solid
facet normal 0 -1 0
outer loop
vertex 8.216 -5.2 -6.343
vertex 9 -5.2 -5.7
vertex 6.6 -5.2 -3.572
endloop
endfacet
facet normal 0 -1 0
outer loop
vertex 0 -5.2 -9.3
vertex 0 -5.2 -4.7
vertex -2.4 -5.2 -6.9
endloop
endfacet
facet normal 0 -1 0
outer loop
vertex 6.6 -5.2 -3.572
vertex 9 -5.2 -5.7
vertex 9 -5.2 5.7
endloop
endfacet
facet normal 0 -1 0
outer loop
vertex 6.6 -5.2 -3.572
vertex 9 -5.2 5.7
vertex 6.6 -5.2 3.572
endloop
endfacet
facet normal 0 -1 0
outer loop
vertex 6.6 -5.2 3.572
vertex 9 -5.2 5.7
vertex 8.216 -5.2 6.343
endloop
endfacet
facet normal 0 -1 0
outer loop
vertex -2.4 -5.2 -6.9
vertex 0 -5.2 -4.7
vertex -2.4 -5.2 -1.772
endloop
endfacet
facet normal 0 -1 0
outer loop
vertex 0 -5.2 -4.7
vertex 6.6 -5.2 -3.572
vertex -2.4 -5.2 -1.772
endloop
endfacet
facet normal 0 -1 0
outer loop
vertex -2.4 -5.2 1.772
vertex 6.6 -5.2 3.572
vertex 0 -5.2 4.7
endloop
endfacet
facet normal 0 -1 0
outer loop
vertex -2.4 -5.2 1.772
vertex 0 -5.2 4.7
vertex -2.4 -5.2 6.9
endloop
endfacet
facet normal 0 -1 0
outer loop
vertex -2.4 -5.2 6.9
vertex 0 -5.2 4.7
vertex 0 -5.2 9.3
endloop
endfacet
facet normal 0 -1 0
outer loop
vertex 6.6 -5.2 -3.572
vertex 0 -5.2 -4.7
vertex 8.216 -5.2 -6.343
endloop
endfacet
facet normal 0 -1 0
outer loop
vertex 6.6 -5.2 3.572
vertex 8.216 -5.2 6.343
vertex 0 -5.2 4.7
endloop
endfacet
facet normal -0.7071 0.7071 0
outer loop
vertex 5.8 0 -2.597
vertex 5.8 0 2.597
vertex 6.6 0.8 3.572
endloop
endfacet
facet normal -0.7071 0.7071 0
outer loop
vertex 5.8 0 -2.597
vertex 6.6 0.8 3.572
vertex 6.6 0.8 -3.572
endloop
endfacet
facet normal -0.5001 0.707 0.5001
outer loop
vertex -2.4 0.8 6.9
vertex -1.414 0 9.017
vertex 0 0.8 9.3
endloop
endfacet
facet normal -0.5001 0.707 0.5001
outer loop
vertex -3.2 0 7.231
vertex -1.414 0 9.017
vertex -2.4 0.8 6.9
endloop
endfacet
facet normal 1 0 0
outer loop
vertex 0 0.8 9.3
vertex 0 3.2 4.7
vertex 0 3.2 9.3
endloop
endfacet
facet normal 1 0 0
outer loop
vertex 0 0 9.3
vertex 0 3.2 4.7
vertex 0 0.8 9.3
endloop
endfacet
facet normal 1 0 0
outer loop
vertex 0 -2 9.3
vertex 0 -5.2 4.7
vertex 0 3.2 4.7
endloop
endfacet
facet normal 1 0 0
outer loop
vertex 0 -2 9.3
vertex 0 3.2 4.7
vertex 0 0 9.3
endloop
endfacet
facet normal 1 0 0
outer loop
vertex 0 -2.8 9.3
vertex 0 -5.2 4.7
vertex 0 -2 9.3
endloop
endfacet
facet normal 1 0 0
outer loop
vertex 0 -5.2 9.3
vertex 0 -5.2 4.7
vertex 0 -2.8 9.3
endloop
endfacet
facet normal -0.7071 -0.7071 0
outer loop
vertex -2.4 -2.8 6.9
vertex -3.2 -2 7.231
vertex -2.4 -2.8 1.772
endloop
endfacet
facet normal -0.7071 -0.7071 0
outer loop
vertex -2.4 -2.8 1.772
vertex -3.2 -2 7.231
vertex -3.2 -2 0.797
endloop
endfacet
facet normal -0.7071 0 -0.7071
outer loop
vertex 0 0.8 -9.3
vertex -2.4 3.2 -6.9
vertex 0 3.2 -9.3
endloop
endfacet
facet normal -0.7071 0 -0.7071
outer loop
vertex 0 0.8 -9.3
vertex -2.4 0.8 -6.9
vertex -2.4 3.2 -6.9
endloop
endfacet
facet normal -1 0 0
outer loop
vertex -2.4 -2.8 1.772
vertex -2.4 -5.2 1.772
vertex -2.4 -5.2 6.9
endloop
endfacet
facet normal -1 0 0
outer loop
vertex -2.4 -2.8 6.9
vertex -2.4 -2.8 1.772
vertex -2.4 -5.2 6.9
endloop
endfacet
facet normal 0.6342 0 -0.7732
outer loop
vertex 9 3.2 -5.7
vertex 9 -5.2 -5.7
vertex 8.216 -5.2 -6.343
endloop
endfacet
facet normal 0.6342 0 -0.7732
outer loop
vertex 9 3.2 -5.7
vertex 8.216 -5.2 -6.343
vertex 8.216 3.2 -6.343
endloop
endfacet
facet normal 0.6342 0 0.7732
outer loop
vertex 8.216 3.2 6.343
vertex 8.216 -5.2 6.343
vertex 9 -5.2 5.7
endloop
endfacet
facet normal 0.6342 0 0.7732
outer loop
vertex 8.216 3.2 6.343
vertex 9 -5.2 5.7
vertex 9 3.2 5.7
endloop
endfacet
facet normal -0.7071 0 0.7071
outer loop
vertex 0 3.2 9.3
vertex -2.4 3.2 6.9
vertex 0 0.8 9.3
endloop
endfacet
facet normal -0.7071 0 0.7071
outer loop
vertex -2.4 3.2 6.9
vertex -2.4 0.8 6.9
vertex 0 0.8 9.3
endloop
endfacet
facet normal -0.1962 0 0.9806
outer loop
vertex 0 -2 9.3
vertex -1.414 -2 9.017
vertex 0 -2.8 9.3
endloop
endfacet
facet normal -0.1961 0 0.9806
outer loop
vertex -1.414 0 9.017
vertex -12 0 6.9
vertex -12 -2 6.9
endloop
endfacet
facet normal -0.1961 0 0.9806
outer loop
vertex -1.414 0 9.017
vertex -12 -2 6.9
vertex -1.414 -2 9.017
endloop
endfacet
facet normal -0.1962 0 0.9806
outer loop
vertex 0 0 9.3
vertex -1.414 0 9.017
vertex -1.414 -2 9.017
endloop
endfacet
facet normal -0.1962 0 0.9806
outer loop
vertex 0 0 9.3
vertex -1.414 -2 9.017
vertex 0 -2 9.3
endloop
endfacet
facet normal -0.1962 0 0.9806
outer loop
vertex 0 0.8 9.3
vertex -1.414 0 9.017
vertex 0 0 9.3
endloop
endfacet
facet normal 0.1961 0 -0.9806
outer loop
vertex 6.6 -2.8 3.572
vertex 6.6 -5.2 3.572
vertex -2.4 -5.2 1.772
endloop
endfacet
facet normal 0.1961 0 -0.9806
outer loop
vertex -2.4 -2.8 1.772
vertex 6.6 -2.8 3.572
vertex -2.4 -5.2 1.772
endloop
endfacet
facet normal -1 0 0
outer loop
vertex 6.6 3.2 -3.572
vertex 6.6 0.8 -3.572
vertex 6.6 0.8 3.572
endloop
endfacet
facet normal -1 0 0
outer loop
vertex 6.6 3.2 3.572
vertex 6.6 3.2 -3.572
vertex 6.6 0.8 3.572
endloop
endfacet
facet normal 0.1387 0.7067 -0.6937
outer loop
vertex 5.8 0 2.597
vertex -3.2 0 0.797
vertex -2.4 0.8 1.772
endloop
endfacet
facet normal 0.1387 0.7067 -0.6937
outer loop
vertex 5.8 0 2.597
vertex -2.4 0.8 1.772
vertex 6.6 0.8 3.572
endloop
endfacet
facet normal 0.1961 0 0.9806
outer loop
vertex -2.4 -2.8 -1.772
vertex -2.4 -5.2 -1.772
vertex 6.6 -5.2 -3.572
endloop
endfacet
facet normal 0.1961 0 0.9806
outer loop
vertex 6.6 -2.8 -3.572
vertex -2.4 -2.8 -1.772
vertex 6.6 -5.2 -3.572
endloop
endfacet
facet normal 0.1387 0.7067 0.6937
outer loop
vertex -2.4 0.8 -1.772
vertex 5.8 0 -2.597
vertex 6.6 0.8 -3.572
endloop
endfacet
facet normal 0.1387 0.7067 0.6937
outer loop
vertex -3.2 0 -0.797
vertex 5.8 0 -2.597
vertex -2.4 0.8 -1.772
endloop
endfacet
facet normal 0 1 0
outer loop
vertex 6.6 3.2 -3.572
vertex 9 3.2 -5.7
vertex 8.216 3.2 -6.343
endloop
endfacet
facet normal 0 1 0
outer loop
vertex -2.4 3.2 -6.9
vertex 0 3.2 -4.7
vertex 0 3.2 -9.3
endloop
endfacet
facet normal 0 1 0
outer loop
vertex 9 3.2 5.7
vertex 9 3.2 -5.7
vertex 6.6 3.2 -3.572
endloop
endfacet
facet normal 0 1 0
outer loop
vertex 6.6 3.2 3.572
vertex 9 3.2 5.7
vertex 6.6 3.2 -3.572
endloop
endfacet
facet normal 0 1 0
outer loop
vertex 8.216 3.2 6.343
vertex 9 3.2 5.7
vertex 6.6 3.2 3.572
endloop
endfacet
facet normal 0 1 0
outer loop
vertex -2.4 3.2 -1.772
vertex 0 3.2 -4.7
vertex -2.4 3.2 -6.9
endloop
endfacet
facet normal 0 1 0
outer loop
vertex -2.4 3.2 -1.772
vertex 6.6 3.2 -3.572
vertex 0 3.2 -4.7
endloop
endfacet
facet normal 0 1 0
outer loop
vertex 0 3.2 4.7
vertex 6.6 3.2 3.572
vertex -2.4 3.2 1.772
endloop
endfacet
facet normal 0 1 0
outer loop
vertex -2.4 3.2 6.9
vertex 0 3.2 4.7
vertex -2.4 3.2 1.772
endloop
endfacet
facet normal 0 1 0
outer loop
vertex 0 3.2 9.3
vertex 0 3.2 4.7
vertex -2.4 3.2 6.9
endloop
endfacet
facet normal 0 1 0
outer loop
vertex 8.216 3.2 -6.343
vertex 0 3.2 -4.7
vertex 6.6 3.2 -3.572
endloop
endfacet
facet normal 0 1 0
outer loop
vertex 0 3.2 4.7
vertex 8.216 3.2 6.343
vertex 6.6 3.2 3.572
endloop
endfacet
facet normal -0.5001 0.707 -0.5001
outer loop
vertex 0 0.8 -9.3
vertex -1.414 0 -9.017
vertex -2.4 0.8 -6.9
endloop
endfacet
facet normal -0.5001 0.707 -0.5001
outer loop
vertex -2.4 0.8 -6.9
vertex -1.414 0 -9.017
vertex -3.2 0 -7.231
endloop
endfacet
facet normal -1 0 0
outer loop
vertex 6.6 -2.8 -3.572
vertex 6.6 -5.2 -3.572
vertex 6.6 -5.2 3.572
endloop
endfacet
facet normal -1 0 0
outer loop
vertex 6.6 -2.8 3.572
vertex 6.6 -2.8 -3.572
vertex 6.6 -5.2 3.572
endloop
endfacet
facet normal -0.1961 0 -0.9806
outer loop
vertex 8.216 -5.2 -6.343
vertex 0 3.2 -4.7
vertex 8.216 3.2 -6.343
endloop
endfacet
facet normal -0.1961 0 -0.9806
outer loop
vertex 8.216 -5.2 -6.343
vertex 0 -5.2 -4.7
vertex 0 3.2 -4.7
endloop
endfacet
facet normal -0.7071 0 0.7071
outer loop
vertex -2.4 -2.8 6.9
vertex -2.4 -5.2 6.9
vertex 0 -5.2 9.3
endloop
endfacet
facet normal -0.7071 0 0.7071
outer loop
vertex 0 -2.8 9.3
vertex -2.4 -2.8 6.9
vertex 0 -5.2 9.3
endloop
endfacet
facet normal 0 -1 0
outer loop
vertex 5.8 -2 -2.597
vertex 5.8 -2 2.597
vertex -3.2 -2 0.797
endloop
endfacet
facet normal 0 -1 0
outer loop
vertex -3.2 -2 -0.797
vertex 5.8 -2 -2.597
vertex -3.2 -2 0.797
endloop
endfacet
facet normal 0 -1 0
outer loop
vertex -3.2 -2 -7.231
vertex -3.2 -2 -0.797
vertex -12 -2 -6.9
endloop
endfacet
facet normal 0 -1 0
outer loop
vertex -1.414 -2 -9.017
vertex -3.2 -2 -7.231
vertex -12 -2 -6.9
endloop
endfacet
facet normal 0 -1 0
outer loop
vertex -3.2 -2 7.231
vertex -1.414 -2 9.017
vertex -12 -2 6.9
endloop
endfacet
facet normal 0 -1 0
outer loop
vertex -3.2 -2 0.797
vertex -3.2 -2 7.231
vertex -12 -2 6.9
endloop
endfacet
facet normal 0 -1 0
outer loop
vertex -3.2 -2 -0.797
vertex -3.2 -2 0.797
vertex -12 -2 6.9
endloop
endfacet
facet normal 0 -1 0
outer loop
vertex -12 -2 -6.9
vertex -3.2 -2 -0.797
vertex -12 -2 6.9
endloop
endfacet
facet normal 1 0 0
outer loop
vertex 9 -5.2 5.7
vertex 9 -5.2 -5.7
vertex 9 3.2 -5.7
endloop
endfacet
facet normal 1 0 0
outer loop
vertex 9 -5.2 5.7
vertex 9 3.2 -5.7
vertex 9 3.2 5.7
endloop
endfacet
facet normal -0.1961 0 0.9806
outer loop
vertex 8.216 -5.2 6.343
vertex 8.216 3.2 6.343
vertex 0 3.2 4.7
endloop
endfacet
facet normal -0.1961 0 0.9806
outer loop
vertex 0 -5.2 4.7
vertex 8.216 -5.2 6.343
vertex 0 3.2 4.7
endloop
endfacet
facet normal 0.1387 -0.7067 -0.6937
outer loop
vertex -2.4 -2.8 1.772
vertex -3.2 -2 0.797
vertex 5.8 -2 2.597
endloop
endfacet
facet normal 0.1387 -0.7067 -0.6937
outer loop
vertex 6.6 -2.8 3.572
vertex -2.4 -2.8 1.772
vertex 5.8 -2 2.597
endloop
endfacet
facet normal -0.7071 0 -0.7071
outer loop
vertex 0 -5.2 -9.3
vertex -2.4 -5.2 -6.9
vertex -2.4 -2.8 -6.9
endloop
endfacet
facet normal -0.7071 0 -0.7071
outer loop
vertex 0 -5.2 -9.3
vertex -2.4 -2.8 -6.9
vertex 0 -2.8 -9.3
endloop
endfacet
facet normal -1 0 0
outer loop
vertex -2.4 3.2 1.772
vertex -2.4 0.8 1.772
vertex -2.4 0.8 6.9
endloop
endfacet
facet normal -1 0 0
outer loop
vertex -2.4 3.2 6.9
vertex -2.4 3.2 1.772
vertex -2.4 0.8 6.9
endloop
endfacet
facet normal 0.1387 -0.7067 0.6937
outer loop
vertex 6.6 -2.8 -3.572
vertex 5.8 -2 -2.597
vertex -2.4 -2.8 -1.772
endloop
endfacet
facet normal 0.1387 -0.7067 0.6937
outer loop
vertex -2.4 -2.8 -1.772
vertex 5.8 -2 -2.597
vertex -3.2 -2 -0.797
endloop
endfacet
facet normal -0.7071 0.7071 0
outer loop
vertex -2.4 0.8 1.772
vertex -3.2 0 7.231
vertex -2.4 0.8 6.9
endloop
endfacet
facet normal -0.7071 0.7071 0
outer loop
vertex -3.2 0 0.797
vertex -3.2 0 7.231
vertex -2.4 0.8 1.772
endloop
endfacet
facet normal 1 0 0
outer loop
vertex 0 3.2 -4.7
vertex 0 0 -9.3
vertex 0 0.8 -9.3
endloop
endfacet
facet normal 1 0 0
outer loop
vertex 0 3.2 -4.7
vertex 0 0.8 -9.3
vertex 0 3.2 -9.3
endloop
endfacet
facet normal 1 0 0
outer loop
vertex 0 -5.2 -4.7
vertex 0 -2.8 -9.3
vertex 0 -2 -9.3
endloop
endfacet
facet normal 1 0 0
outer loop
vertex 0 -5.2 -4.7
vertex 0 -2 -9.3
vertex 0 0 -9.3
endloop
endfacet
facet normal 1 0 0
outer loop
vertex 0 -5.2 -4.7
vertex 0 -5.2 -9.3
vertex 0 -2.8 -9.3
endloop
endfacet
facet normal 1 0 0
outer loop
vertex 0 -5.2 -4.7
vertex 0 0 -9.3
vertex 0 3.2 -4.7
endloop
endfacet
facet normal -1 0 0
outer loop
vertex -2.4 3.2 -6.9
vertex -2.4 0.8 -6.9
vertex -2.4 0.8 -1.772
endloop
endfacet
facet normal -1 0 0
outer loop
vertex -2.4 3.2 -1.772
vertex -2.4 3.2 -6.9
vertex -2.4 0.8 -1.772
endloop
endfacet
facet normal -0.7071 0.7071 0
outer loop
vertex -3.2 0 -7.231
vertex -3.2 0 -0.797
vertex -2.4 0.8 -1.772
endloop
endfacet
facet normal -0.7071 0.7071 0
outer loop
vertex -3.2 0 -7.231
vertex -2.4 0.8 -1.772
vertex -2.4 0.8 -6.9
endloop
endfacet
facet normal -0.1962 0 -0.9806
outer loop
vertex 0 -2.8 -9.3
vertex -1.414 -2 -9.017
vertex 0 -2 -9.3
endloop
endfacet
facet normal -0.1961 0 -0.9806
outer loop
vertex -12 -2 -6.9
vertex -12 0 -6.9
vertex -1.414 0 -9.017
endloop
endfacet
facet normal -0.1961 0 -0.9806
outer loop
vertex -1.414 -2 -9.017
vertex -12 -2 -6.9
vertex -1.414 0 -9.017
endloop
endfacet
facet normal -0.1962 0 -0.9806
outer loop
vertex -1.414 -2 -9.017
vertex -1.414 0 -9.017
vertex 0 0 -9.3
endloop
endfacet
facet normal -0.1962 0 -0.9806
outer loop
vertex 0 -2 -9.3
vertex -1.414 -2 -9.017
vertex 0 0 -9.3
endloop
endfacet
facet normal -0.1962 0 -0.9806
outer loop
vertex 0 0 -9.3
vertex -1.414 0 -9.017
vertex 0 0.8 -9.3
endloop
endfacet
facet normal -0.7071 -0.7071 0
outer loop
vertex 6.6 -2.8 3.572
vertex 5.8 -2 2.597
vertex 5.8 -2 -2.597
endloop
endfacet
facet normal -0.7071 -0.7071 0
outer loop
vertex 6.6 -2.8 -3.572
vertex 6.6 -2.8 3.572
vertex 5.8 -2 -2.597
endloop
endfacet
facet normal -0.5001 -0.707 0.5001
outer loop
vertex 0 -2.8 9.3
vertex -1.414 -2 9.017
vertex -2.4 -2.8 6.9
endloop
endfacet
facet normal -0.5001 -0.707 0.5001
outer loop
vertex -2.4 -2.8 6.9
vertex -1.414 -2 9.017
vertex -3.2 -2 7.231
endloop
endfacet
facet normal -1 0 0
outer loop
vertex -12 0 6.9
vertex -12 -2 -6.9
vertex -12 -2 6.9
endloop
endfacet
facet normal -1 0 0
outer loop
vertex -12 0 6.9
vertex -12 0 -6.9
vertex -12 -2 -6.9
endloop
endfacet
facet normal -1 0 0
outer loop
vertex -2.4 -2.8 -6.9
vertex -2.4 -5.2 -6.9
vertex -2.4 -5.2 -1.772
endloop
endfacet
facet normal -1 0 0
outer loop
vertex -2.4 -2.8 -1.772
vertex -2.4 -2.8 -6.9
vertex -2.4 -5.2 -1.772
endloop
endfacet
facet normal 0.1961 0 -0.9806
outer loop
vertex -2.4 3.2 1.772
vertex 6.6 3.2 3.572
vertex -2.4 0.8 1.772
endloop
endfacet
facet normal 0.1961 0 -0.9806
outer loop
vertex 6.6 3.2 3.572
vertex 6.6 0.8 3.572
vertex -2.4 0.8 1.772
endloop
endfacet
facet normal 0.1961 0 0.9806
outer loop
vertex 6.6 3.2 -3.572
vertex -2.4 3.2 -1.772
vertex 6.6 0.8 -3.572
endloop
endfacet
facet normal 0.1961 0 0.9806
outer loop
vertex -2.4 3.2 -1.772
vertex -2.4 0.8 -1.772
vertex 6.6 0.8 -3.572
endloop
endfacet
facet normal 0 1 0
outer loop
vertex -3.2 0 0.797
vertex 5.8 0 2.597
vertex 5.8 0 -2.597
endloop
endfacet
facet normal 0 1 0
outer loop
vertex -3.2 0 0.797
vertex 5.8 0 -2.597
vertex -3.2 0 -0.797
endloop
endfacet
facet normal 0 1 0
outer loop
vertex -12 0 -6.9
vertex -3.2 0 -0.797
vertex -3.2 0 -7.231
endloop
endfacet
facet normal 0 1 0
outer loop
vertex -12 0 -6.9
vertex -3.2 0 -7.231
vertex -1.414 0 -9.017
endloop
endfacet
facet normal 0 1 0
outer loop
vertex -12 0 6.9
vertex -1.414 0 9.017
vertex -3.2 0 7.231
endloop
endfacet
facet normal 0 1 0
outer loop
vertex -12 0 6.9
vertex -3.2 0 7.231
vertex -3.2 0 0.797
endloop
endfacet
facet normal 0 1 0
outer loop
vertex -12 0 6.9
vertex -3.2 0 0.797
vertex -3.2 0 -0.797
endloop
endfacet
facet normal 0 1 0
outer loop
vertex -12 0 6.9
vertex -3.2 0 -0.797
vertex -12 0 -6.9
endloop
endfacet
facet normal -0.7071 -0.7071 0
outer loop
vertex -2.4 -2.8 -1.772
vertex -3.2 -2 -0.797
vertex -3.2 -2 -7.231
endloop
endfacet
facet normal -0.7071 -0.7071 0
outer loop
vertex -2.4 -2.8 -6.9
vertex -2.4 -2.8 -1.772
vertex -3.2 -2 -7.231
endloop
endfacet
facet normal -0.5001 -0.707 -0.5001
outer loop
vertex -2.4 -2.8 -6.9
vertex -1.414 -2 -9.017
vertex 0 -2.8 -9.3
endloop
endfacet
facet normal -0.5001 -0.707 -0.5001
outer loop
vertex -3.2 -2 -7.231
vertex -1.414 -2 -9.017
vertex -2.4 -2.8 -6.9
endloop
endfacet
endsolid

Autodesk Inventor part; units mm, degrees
ref_plane "YZ Plane" through (0, 0, 0) normal (1, 0, 0) x (0, 1, 0)
ref_plane "XZ Plane" through (0, 0, 0) normal (0, 1, 0) x (-1, 0, 0)
ref_plane "XY Plane" through (0, 0, 0) normal (0, 0, 1) x (1, 0, 0)
sketch "スケッチ1" plane through (0, 0, 0) normal (0, 1, 0) x (-1, 0, 0)
  line L0 (0, -13.02) -> (0, 13.02) projected
  line L1 (-13.2, 0) -> (16.2, 0) projected
  line L2 (0, -4.7) -> (-9, -6.5)
  line L3 (-9, -6.5) -> (-9, 6.5)
  line L4 (-9, 6.5) -> (0, 4.7)
  line L5 (0, -9.3) -> (0, -4.7)
  line L6 (0, 4.7) -> (0, 9.3)
  line L7 (2.4, -1.7725) -> (-6.6, -3.5725)
  line L8 (-6.6, -3.5725) -> (-6.6, 3.5725)
  line L9 (-6.6, 3.5725) -> (2.4, 1.7725)
  line L10 (2.4, -6.9) -> (2.4, -1.7725)
  line L11 (2.4, 1.7725) -> (2.4, 6.9)
  line L12 (2.4, -6.9) -> (0, -9.3)
  line L13 (2.4, 6.9) -> (0, 9.3)
  line L14 (12, -6.9) -> (12, 6.9)
  line L15 (12, 6.9) -> (0, 9.3)
  line L16 (12, -6.9) -> (0, -9.3)
  point P0 (0, 0)
  point P1 (0, 9.3)
  point P2 (0, -9.3)
  dimension "d2" = 9
  dimension "d3" = 13
  dimension "d5" = 9.4
  dimension "d13" = 2.4
  dimension "d14" = 2.4
  dimension "d15" = 2.4
  dimension "d24" = 2.4
  dimension "d63" = 2.4
  dimension "d64" = 18.6
  dimension "d65" = 12
  dimension "d74" = 18.6
  dimension "d75" = 2.4
extrude "押し出し2" add sketch "スケッチ1" along normal blind 3.2 and the other way blind 5.2 contours L0 L7 L10 L12 | L2 L3 L1 L8 L7 L0 | L3 L4 L0 L9 L8 L1 | L0 L13 L11 L9
extrude "押し出し1" add sketch "スケッチ1" against normal blind 2
chamfer "面取り4" distance 0.8 angle 45 2 edges at (9, -1, 6.5) (9, -1, -6.5)
chamfer "面取り5" distance 0.8 angle 45 14 edges at (2.1, 0, -2.6725) (6.6, 0, 0) (-2.4, 0, -4.3362) (2.1, 0, 2.6725) (-2.4, 0, 4.3362) (-1.2, 0, 8.1) (-1.2, 0, -8.1) (-1.2, -2, 8.1) (-2.4, -2, 4.3362) (2.1, -2, 2.6725) (6.6, -2, 0) (2.1, -2, -2.6725) (-2.4, -2, -4.3362) (-1.2, -2, -8.1)
equation "\"d2\" = JointMH"
equation "\"d3\" = JointMW1 - 2 * cp"
equation "\"d5\" = JointMW2 - 2 * cp"
equation "\"d13\" = InnerWall"
equation "\"d14\" = InnerWall"
equation "\"d15\" = InnerWall"
equation "\"d24\" = InnerWall"
equation "\"rib\" = 0.5"
equation "\"gap\" = 0.2"
equation "\"JointMH\" = 9"
equation "\"JointMW1\" = 13"
equation "\"cp\" = 0"
equation "\"JointMW2\" = 9.4"
equation "\"InnerWall\" = 2.4"
properties part number "StraightRais-215" material "ABS プラスチック"
